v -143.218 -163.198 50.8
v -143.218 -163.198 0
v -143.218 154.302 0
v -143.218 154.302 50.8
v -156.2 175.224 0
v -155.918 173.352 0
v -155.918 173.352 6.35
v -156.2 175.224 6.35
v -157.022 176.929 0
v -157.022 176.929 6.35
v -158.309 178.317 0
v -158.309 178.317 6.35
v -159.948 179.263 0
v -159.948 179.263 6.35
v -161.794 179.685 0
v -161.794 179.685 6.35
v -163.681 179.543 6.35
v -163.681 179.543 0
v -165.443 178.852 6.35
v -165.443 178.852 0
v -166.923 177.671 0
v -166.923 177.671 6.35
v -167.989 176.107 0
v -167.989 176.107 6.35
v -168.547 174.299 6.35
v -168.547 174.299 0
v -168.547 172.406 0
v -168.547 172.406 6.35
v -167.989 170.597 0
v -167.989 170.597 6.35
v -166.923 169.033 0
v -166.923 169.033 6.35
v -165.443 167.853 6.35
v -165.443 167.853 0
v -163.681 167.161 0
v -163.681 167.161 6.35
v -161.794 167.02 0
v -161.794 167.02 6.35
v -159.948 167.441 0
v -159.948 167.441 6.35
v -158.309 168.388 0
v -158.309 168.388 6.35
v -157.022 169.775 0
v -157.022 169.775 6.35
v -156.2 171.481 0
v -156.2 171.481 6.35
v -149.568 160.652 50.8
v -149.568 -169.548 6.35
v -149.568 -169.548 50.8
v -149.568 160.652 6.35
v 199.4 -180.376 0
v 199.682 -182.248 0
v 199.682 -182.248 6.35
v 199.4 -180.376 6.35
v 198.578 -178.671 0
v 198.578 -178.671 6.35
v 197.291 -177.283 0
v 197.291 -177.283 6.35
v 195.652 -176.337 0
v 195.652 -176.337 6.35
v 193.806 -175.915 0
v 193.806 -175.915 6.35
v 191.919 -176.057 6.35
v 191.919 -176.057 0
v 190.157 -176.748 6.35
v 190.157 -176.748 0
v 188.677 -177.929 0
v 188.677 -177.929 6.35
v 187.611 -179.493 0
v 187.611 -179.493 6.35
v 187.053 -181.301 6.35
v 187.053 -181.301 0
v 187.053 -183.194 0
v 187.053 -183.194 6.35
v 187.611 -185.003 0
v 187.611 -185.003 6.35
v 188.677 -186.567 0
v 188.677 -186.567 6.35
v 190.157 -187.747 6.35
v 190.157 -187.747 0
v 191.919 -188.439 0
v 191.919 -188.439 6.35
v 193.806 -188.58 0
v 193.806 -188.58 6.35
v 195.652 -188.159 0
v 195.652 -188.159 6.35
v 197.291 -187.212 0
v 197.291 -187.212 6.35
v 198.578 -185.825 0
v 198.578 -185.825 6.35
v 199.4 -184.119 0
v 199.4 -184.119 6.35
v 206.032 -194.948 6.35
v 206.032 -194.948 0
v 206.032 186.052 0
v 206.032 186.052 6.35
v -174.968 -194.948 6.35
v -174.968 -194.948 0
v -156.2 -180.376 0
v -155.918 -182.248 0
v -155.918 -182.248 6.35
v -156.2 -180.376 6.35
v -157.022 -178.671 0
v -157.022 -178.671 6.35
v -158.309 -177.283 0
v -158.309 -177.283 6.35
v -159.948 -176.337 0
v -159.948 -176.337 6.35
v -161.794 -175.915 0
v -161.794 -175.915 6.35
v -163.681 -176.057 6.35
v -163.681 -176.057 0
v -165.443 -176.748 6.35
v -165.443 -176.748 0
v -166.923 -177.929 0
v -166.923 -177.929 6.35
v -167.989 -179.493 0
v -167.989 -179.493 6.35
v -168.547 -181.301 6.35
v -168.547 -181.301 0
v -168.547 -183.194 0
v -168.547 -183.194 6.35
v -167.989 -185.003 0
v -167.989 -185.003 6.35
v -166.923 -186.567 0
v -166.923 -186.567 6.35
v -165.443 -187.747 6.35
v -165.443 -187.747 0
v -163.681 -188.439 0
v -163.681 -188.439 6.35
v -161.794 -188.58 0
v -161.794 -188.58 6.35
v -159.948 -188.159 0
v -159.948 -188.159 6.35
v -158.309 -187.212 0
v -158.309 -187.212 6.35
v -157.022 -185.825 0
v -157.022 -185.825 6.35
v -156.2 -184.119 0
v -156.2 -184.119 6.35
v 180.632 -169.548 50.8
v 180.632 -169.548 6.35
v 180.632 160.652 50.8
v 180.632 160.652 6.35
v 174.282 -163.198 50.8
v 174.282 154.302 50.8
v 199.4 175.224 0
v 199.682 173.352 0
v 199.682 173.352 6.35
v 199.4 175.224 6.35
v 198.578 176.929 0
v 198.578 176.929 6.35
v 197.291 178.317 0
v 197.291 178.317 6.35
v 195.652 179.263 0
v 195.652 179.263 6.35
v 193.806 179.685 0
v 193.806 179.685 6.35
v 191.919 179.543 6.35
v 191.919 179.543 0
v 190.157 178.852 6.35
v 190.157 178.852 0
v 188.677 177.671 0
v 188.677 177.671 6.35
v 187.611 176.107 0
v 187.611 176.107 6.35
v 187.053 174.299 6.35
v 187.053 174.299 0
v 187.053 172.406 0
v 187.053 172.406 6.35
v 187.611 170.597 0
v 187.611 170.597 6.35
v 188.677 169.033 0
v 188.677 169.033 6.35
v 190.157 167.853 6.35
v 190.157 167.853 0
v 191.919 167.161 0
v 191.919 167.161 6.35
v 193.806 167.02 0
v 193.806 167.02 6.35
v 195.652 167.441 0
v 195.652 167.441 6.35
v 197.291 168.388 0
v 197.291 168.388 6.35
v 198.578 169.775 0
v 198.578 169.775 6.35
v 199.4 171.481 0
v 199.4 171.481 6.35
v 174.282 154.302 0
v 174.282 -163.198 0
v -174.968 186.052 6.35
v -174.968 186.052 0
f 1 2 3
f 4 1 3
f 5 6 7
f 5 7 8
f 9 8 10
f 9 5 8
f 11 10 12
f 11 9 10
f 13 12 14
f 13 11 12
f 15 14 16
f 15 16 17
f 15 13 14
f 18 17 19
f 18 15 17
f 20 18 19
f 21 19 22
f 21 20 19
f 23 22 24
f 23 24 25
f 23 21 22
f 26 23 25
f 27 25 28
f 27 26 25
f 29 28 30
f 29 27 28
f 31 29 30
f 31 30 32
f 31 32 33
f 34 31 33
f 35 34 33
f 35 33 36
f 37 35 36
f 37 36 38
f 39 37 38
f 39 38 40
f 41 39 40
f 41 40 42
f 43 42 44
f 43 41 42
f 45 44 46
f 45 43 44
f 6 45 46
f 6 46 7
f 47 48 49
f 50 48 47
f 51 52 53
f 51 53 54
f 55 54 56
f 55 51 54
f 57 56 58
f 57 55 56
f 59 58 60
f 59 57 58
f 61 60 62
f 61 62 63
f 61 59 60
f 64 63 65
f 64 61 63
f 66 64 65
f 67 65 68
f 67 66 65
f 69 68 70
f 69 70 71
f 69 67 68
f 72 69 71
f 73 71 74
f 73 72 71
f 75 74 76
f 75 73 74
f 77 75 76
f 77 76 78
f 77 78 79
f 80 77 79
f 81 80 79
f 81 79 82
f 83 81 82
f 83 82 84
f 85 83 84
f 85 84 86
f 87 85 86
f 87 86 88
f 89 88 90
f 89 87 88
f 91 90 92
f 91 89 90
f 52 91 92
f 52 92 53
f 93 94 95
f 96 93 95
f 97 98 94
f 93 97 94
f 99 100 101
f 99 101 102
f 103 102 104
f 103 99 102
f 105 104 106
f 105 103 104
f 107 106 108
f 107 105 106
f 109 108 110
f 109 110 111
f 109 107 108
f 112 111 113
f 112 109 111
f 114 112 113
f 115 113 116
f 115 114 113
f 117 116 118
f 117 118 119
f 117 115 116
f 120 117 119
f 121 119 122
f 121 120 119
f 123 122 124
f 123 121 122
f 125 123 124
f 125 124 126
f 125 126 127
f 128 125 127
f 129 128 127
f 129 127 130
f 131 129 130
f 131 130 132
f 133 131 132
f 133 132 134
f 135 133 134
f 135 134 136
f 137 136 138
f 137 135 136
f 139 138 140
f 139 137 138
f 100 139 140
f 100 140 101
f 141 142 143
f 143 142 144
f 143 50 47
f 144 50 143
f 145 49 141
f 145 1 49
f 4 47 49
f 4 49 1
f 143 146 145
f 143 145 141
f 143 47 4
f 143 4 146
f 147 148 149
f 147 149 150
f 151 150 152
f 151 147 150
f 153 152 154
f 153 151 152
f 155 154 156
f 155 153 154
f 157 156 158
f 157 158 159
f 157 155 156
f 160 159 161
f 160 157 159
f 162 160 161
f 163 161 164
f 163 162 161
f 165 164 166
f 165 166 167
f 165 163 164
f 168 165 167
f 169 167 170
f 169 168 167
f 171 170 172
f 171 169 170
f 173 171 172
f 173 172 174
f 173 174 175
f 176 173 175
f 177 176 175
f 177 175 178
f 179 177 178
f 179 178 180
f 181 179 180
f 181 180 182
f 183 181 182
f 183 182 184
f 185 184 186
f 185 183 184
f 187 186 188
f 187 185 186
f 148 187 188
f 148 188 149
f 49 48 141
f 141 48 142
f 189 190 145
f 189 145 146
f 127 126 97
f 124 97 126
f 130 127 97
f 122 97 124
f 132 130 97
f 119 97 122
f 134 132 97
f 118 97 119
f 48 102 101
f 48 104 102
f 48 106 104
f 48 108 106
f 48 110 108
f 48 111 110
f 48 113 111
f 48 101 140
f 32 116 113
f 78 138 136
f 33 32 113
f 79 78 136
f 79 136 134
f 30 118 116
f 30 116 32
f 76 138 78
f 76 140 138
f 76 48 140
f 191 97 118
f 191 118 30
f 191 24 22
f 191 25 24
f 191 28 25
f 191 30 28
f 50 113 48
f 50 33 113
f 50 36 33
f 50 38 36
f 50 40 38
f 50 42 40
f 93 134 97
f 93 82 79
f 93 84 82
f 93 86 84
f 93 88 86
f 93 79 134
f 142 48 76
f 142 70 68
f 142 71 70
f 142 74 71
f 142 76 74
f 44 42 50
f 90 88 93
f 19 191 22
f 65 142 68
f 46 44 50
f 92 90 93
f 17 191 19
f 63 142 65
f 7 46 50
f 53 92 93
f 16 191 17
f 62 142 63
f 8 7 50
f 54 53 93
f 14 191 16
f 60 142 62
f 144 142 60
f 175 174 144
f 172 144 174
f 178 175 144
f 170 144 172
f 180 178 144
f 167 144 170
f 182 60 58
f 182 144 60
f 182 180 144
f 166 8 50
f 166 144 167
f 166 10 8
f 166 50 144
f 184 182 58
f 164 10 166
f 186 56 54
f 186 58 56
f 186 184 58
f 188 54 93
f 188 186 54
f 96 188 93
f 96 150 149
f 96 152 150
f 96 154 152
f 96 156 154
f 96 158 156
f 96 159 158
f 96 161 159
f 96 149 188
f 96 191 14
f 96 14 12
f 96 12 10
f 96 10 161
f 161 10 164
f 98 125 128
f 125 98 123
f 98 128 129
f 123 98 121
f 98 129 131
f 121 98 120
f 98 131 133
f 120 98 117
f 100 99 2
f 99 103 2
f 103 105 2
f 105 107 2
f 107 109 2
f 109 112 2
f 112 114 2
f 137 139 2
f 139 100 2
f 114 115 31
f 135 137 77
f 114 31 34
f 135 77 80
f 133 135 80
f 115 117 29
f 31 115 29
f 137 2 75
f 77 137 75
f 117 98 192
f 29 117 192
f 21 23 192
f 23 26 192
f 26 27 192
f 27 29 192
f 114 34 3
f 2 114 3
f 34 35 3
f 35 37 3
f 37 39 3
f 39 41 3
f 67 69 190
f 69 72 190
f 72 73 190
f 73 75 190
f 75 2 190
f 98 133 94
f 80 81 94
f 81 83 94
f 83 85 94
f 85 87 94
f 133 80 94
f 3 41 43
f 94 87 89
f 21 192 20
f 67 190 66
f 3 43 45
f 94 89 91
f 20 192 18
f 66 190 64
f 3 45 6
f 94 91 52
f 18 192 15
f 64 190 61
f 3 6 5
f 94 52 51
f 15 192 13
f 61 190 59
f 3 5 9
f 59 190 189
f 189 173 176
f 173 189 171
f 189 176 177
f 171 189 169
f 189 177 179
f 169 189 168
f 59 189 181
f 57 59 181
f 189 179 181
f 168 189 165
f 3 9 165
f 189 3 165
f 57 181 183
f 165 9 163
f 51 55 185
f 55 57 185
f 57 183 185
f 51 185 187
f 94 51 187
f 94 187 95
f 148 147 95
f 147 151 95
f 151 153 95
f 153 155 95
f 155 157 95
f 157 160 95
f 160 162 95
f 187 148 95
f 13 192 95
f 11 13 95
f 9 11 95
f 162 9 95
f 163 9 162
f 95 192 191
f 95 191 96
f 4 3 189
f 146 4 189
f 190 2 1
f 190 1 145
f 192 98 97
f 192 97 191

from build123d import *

# Parameters (mm, degrees)
F0_W     = 381
F0_H     = 381
F0_R     = 6.35
F0_W_2   = 330.2
F0_H_2   = 330.2
F1_DEPTH = 6.35
F0_W_3   = 317.5
F0_H_3   = 317.5
F2_DEPTH = 50.8


with BuildPart() as f1:
    # F0 (on Top) → F1 (new body)
    with BuildSketch(Plane.XY):
        with Locations((15.531801, -4.447729)):
            Rectangle(F0_W, F0_H)
        with Locations((-162.268199, -182.247729)):
            Circle(F0_R, mode=Mode.SUBTRACT)
        with Locations((193.331801, -182.247729)):
            Circle(F0_R, mode=Mode.SUBTRACT)
        with Locations((-162.268199, 173.352271)):
            Circle(F0_R, mode=Mode.SUBTRACT)
        with Locations((15.531801, -4.447729)):
            Rectangle(F0_W_2, F0_H_2, mode=Mode.SUBTRACT)
        with Locations((193.331801, 173.352271)):
            Circle(F0_R, mode=Mode.SUBTRACT)
    extrude(amount=F1_DEPTH)

    # F0 (on Top) → F2 (join)
    with BuildSketch(Plane.XY):
        with Locations((15.531801, -4.447729)):
            Rectangle(F0_W_2, F0_H_2)
        with Locations((15.531801, -4.447729)):
            Rectangle(F0_W_3, F0_H_3, mode=Mode.SUBTRACT)
    extrude(amount=F2_DEPTH)


solid = f1.part
